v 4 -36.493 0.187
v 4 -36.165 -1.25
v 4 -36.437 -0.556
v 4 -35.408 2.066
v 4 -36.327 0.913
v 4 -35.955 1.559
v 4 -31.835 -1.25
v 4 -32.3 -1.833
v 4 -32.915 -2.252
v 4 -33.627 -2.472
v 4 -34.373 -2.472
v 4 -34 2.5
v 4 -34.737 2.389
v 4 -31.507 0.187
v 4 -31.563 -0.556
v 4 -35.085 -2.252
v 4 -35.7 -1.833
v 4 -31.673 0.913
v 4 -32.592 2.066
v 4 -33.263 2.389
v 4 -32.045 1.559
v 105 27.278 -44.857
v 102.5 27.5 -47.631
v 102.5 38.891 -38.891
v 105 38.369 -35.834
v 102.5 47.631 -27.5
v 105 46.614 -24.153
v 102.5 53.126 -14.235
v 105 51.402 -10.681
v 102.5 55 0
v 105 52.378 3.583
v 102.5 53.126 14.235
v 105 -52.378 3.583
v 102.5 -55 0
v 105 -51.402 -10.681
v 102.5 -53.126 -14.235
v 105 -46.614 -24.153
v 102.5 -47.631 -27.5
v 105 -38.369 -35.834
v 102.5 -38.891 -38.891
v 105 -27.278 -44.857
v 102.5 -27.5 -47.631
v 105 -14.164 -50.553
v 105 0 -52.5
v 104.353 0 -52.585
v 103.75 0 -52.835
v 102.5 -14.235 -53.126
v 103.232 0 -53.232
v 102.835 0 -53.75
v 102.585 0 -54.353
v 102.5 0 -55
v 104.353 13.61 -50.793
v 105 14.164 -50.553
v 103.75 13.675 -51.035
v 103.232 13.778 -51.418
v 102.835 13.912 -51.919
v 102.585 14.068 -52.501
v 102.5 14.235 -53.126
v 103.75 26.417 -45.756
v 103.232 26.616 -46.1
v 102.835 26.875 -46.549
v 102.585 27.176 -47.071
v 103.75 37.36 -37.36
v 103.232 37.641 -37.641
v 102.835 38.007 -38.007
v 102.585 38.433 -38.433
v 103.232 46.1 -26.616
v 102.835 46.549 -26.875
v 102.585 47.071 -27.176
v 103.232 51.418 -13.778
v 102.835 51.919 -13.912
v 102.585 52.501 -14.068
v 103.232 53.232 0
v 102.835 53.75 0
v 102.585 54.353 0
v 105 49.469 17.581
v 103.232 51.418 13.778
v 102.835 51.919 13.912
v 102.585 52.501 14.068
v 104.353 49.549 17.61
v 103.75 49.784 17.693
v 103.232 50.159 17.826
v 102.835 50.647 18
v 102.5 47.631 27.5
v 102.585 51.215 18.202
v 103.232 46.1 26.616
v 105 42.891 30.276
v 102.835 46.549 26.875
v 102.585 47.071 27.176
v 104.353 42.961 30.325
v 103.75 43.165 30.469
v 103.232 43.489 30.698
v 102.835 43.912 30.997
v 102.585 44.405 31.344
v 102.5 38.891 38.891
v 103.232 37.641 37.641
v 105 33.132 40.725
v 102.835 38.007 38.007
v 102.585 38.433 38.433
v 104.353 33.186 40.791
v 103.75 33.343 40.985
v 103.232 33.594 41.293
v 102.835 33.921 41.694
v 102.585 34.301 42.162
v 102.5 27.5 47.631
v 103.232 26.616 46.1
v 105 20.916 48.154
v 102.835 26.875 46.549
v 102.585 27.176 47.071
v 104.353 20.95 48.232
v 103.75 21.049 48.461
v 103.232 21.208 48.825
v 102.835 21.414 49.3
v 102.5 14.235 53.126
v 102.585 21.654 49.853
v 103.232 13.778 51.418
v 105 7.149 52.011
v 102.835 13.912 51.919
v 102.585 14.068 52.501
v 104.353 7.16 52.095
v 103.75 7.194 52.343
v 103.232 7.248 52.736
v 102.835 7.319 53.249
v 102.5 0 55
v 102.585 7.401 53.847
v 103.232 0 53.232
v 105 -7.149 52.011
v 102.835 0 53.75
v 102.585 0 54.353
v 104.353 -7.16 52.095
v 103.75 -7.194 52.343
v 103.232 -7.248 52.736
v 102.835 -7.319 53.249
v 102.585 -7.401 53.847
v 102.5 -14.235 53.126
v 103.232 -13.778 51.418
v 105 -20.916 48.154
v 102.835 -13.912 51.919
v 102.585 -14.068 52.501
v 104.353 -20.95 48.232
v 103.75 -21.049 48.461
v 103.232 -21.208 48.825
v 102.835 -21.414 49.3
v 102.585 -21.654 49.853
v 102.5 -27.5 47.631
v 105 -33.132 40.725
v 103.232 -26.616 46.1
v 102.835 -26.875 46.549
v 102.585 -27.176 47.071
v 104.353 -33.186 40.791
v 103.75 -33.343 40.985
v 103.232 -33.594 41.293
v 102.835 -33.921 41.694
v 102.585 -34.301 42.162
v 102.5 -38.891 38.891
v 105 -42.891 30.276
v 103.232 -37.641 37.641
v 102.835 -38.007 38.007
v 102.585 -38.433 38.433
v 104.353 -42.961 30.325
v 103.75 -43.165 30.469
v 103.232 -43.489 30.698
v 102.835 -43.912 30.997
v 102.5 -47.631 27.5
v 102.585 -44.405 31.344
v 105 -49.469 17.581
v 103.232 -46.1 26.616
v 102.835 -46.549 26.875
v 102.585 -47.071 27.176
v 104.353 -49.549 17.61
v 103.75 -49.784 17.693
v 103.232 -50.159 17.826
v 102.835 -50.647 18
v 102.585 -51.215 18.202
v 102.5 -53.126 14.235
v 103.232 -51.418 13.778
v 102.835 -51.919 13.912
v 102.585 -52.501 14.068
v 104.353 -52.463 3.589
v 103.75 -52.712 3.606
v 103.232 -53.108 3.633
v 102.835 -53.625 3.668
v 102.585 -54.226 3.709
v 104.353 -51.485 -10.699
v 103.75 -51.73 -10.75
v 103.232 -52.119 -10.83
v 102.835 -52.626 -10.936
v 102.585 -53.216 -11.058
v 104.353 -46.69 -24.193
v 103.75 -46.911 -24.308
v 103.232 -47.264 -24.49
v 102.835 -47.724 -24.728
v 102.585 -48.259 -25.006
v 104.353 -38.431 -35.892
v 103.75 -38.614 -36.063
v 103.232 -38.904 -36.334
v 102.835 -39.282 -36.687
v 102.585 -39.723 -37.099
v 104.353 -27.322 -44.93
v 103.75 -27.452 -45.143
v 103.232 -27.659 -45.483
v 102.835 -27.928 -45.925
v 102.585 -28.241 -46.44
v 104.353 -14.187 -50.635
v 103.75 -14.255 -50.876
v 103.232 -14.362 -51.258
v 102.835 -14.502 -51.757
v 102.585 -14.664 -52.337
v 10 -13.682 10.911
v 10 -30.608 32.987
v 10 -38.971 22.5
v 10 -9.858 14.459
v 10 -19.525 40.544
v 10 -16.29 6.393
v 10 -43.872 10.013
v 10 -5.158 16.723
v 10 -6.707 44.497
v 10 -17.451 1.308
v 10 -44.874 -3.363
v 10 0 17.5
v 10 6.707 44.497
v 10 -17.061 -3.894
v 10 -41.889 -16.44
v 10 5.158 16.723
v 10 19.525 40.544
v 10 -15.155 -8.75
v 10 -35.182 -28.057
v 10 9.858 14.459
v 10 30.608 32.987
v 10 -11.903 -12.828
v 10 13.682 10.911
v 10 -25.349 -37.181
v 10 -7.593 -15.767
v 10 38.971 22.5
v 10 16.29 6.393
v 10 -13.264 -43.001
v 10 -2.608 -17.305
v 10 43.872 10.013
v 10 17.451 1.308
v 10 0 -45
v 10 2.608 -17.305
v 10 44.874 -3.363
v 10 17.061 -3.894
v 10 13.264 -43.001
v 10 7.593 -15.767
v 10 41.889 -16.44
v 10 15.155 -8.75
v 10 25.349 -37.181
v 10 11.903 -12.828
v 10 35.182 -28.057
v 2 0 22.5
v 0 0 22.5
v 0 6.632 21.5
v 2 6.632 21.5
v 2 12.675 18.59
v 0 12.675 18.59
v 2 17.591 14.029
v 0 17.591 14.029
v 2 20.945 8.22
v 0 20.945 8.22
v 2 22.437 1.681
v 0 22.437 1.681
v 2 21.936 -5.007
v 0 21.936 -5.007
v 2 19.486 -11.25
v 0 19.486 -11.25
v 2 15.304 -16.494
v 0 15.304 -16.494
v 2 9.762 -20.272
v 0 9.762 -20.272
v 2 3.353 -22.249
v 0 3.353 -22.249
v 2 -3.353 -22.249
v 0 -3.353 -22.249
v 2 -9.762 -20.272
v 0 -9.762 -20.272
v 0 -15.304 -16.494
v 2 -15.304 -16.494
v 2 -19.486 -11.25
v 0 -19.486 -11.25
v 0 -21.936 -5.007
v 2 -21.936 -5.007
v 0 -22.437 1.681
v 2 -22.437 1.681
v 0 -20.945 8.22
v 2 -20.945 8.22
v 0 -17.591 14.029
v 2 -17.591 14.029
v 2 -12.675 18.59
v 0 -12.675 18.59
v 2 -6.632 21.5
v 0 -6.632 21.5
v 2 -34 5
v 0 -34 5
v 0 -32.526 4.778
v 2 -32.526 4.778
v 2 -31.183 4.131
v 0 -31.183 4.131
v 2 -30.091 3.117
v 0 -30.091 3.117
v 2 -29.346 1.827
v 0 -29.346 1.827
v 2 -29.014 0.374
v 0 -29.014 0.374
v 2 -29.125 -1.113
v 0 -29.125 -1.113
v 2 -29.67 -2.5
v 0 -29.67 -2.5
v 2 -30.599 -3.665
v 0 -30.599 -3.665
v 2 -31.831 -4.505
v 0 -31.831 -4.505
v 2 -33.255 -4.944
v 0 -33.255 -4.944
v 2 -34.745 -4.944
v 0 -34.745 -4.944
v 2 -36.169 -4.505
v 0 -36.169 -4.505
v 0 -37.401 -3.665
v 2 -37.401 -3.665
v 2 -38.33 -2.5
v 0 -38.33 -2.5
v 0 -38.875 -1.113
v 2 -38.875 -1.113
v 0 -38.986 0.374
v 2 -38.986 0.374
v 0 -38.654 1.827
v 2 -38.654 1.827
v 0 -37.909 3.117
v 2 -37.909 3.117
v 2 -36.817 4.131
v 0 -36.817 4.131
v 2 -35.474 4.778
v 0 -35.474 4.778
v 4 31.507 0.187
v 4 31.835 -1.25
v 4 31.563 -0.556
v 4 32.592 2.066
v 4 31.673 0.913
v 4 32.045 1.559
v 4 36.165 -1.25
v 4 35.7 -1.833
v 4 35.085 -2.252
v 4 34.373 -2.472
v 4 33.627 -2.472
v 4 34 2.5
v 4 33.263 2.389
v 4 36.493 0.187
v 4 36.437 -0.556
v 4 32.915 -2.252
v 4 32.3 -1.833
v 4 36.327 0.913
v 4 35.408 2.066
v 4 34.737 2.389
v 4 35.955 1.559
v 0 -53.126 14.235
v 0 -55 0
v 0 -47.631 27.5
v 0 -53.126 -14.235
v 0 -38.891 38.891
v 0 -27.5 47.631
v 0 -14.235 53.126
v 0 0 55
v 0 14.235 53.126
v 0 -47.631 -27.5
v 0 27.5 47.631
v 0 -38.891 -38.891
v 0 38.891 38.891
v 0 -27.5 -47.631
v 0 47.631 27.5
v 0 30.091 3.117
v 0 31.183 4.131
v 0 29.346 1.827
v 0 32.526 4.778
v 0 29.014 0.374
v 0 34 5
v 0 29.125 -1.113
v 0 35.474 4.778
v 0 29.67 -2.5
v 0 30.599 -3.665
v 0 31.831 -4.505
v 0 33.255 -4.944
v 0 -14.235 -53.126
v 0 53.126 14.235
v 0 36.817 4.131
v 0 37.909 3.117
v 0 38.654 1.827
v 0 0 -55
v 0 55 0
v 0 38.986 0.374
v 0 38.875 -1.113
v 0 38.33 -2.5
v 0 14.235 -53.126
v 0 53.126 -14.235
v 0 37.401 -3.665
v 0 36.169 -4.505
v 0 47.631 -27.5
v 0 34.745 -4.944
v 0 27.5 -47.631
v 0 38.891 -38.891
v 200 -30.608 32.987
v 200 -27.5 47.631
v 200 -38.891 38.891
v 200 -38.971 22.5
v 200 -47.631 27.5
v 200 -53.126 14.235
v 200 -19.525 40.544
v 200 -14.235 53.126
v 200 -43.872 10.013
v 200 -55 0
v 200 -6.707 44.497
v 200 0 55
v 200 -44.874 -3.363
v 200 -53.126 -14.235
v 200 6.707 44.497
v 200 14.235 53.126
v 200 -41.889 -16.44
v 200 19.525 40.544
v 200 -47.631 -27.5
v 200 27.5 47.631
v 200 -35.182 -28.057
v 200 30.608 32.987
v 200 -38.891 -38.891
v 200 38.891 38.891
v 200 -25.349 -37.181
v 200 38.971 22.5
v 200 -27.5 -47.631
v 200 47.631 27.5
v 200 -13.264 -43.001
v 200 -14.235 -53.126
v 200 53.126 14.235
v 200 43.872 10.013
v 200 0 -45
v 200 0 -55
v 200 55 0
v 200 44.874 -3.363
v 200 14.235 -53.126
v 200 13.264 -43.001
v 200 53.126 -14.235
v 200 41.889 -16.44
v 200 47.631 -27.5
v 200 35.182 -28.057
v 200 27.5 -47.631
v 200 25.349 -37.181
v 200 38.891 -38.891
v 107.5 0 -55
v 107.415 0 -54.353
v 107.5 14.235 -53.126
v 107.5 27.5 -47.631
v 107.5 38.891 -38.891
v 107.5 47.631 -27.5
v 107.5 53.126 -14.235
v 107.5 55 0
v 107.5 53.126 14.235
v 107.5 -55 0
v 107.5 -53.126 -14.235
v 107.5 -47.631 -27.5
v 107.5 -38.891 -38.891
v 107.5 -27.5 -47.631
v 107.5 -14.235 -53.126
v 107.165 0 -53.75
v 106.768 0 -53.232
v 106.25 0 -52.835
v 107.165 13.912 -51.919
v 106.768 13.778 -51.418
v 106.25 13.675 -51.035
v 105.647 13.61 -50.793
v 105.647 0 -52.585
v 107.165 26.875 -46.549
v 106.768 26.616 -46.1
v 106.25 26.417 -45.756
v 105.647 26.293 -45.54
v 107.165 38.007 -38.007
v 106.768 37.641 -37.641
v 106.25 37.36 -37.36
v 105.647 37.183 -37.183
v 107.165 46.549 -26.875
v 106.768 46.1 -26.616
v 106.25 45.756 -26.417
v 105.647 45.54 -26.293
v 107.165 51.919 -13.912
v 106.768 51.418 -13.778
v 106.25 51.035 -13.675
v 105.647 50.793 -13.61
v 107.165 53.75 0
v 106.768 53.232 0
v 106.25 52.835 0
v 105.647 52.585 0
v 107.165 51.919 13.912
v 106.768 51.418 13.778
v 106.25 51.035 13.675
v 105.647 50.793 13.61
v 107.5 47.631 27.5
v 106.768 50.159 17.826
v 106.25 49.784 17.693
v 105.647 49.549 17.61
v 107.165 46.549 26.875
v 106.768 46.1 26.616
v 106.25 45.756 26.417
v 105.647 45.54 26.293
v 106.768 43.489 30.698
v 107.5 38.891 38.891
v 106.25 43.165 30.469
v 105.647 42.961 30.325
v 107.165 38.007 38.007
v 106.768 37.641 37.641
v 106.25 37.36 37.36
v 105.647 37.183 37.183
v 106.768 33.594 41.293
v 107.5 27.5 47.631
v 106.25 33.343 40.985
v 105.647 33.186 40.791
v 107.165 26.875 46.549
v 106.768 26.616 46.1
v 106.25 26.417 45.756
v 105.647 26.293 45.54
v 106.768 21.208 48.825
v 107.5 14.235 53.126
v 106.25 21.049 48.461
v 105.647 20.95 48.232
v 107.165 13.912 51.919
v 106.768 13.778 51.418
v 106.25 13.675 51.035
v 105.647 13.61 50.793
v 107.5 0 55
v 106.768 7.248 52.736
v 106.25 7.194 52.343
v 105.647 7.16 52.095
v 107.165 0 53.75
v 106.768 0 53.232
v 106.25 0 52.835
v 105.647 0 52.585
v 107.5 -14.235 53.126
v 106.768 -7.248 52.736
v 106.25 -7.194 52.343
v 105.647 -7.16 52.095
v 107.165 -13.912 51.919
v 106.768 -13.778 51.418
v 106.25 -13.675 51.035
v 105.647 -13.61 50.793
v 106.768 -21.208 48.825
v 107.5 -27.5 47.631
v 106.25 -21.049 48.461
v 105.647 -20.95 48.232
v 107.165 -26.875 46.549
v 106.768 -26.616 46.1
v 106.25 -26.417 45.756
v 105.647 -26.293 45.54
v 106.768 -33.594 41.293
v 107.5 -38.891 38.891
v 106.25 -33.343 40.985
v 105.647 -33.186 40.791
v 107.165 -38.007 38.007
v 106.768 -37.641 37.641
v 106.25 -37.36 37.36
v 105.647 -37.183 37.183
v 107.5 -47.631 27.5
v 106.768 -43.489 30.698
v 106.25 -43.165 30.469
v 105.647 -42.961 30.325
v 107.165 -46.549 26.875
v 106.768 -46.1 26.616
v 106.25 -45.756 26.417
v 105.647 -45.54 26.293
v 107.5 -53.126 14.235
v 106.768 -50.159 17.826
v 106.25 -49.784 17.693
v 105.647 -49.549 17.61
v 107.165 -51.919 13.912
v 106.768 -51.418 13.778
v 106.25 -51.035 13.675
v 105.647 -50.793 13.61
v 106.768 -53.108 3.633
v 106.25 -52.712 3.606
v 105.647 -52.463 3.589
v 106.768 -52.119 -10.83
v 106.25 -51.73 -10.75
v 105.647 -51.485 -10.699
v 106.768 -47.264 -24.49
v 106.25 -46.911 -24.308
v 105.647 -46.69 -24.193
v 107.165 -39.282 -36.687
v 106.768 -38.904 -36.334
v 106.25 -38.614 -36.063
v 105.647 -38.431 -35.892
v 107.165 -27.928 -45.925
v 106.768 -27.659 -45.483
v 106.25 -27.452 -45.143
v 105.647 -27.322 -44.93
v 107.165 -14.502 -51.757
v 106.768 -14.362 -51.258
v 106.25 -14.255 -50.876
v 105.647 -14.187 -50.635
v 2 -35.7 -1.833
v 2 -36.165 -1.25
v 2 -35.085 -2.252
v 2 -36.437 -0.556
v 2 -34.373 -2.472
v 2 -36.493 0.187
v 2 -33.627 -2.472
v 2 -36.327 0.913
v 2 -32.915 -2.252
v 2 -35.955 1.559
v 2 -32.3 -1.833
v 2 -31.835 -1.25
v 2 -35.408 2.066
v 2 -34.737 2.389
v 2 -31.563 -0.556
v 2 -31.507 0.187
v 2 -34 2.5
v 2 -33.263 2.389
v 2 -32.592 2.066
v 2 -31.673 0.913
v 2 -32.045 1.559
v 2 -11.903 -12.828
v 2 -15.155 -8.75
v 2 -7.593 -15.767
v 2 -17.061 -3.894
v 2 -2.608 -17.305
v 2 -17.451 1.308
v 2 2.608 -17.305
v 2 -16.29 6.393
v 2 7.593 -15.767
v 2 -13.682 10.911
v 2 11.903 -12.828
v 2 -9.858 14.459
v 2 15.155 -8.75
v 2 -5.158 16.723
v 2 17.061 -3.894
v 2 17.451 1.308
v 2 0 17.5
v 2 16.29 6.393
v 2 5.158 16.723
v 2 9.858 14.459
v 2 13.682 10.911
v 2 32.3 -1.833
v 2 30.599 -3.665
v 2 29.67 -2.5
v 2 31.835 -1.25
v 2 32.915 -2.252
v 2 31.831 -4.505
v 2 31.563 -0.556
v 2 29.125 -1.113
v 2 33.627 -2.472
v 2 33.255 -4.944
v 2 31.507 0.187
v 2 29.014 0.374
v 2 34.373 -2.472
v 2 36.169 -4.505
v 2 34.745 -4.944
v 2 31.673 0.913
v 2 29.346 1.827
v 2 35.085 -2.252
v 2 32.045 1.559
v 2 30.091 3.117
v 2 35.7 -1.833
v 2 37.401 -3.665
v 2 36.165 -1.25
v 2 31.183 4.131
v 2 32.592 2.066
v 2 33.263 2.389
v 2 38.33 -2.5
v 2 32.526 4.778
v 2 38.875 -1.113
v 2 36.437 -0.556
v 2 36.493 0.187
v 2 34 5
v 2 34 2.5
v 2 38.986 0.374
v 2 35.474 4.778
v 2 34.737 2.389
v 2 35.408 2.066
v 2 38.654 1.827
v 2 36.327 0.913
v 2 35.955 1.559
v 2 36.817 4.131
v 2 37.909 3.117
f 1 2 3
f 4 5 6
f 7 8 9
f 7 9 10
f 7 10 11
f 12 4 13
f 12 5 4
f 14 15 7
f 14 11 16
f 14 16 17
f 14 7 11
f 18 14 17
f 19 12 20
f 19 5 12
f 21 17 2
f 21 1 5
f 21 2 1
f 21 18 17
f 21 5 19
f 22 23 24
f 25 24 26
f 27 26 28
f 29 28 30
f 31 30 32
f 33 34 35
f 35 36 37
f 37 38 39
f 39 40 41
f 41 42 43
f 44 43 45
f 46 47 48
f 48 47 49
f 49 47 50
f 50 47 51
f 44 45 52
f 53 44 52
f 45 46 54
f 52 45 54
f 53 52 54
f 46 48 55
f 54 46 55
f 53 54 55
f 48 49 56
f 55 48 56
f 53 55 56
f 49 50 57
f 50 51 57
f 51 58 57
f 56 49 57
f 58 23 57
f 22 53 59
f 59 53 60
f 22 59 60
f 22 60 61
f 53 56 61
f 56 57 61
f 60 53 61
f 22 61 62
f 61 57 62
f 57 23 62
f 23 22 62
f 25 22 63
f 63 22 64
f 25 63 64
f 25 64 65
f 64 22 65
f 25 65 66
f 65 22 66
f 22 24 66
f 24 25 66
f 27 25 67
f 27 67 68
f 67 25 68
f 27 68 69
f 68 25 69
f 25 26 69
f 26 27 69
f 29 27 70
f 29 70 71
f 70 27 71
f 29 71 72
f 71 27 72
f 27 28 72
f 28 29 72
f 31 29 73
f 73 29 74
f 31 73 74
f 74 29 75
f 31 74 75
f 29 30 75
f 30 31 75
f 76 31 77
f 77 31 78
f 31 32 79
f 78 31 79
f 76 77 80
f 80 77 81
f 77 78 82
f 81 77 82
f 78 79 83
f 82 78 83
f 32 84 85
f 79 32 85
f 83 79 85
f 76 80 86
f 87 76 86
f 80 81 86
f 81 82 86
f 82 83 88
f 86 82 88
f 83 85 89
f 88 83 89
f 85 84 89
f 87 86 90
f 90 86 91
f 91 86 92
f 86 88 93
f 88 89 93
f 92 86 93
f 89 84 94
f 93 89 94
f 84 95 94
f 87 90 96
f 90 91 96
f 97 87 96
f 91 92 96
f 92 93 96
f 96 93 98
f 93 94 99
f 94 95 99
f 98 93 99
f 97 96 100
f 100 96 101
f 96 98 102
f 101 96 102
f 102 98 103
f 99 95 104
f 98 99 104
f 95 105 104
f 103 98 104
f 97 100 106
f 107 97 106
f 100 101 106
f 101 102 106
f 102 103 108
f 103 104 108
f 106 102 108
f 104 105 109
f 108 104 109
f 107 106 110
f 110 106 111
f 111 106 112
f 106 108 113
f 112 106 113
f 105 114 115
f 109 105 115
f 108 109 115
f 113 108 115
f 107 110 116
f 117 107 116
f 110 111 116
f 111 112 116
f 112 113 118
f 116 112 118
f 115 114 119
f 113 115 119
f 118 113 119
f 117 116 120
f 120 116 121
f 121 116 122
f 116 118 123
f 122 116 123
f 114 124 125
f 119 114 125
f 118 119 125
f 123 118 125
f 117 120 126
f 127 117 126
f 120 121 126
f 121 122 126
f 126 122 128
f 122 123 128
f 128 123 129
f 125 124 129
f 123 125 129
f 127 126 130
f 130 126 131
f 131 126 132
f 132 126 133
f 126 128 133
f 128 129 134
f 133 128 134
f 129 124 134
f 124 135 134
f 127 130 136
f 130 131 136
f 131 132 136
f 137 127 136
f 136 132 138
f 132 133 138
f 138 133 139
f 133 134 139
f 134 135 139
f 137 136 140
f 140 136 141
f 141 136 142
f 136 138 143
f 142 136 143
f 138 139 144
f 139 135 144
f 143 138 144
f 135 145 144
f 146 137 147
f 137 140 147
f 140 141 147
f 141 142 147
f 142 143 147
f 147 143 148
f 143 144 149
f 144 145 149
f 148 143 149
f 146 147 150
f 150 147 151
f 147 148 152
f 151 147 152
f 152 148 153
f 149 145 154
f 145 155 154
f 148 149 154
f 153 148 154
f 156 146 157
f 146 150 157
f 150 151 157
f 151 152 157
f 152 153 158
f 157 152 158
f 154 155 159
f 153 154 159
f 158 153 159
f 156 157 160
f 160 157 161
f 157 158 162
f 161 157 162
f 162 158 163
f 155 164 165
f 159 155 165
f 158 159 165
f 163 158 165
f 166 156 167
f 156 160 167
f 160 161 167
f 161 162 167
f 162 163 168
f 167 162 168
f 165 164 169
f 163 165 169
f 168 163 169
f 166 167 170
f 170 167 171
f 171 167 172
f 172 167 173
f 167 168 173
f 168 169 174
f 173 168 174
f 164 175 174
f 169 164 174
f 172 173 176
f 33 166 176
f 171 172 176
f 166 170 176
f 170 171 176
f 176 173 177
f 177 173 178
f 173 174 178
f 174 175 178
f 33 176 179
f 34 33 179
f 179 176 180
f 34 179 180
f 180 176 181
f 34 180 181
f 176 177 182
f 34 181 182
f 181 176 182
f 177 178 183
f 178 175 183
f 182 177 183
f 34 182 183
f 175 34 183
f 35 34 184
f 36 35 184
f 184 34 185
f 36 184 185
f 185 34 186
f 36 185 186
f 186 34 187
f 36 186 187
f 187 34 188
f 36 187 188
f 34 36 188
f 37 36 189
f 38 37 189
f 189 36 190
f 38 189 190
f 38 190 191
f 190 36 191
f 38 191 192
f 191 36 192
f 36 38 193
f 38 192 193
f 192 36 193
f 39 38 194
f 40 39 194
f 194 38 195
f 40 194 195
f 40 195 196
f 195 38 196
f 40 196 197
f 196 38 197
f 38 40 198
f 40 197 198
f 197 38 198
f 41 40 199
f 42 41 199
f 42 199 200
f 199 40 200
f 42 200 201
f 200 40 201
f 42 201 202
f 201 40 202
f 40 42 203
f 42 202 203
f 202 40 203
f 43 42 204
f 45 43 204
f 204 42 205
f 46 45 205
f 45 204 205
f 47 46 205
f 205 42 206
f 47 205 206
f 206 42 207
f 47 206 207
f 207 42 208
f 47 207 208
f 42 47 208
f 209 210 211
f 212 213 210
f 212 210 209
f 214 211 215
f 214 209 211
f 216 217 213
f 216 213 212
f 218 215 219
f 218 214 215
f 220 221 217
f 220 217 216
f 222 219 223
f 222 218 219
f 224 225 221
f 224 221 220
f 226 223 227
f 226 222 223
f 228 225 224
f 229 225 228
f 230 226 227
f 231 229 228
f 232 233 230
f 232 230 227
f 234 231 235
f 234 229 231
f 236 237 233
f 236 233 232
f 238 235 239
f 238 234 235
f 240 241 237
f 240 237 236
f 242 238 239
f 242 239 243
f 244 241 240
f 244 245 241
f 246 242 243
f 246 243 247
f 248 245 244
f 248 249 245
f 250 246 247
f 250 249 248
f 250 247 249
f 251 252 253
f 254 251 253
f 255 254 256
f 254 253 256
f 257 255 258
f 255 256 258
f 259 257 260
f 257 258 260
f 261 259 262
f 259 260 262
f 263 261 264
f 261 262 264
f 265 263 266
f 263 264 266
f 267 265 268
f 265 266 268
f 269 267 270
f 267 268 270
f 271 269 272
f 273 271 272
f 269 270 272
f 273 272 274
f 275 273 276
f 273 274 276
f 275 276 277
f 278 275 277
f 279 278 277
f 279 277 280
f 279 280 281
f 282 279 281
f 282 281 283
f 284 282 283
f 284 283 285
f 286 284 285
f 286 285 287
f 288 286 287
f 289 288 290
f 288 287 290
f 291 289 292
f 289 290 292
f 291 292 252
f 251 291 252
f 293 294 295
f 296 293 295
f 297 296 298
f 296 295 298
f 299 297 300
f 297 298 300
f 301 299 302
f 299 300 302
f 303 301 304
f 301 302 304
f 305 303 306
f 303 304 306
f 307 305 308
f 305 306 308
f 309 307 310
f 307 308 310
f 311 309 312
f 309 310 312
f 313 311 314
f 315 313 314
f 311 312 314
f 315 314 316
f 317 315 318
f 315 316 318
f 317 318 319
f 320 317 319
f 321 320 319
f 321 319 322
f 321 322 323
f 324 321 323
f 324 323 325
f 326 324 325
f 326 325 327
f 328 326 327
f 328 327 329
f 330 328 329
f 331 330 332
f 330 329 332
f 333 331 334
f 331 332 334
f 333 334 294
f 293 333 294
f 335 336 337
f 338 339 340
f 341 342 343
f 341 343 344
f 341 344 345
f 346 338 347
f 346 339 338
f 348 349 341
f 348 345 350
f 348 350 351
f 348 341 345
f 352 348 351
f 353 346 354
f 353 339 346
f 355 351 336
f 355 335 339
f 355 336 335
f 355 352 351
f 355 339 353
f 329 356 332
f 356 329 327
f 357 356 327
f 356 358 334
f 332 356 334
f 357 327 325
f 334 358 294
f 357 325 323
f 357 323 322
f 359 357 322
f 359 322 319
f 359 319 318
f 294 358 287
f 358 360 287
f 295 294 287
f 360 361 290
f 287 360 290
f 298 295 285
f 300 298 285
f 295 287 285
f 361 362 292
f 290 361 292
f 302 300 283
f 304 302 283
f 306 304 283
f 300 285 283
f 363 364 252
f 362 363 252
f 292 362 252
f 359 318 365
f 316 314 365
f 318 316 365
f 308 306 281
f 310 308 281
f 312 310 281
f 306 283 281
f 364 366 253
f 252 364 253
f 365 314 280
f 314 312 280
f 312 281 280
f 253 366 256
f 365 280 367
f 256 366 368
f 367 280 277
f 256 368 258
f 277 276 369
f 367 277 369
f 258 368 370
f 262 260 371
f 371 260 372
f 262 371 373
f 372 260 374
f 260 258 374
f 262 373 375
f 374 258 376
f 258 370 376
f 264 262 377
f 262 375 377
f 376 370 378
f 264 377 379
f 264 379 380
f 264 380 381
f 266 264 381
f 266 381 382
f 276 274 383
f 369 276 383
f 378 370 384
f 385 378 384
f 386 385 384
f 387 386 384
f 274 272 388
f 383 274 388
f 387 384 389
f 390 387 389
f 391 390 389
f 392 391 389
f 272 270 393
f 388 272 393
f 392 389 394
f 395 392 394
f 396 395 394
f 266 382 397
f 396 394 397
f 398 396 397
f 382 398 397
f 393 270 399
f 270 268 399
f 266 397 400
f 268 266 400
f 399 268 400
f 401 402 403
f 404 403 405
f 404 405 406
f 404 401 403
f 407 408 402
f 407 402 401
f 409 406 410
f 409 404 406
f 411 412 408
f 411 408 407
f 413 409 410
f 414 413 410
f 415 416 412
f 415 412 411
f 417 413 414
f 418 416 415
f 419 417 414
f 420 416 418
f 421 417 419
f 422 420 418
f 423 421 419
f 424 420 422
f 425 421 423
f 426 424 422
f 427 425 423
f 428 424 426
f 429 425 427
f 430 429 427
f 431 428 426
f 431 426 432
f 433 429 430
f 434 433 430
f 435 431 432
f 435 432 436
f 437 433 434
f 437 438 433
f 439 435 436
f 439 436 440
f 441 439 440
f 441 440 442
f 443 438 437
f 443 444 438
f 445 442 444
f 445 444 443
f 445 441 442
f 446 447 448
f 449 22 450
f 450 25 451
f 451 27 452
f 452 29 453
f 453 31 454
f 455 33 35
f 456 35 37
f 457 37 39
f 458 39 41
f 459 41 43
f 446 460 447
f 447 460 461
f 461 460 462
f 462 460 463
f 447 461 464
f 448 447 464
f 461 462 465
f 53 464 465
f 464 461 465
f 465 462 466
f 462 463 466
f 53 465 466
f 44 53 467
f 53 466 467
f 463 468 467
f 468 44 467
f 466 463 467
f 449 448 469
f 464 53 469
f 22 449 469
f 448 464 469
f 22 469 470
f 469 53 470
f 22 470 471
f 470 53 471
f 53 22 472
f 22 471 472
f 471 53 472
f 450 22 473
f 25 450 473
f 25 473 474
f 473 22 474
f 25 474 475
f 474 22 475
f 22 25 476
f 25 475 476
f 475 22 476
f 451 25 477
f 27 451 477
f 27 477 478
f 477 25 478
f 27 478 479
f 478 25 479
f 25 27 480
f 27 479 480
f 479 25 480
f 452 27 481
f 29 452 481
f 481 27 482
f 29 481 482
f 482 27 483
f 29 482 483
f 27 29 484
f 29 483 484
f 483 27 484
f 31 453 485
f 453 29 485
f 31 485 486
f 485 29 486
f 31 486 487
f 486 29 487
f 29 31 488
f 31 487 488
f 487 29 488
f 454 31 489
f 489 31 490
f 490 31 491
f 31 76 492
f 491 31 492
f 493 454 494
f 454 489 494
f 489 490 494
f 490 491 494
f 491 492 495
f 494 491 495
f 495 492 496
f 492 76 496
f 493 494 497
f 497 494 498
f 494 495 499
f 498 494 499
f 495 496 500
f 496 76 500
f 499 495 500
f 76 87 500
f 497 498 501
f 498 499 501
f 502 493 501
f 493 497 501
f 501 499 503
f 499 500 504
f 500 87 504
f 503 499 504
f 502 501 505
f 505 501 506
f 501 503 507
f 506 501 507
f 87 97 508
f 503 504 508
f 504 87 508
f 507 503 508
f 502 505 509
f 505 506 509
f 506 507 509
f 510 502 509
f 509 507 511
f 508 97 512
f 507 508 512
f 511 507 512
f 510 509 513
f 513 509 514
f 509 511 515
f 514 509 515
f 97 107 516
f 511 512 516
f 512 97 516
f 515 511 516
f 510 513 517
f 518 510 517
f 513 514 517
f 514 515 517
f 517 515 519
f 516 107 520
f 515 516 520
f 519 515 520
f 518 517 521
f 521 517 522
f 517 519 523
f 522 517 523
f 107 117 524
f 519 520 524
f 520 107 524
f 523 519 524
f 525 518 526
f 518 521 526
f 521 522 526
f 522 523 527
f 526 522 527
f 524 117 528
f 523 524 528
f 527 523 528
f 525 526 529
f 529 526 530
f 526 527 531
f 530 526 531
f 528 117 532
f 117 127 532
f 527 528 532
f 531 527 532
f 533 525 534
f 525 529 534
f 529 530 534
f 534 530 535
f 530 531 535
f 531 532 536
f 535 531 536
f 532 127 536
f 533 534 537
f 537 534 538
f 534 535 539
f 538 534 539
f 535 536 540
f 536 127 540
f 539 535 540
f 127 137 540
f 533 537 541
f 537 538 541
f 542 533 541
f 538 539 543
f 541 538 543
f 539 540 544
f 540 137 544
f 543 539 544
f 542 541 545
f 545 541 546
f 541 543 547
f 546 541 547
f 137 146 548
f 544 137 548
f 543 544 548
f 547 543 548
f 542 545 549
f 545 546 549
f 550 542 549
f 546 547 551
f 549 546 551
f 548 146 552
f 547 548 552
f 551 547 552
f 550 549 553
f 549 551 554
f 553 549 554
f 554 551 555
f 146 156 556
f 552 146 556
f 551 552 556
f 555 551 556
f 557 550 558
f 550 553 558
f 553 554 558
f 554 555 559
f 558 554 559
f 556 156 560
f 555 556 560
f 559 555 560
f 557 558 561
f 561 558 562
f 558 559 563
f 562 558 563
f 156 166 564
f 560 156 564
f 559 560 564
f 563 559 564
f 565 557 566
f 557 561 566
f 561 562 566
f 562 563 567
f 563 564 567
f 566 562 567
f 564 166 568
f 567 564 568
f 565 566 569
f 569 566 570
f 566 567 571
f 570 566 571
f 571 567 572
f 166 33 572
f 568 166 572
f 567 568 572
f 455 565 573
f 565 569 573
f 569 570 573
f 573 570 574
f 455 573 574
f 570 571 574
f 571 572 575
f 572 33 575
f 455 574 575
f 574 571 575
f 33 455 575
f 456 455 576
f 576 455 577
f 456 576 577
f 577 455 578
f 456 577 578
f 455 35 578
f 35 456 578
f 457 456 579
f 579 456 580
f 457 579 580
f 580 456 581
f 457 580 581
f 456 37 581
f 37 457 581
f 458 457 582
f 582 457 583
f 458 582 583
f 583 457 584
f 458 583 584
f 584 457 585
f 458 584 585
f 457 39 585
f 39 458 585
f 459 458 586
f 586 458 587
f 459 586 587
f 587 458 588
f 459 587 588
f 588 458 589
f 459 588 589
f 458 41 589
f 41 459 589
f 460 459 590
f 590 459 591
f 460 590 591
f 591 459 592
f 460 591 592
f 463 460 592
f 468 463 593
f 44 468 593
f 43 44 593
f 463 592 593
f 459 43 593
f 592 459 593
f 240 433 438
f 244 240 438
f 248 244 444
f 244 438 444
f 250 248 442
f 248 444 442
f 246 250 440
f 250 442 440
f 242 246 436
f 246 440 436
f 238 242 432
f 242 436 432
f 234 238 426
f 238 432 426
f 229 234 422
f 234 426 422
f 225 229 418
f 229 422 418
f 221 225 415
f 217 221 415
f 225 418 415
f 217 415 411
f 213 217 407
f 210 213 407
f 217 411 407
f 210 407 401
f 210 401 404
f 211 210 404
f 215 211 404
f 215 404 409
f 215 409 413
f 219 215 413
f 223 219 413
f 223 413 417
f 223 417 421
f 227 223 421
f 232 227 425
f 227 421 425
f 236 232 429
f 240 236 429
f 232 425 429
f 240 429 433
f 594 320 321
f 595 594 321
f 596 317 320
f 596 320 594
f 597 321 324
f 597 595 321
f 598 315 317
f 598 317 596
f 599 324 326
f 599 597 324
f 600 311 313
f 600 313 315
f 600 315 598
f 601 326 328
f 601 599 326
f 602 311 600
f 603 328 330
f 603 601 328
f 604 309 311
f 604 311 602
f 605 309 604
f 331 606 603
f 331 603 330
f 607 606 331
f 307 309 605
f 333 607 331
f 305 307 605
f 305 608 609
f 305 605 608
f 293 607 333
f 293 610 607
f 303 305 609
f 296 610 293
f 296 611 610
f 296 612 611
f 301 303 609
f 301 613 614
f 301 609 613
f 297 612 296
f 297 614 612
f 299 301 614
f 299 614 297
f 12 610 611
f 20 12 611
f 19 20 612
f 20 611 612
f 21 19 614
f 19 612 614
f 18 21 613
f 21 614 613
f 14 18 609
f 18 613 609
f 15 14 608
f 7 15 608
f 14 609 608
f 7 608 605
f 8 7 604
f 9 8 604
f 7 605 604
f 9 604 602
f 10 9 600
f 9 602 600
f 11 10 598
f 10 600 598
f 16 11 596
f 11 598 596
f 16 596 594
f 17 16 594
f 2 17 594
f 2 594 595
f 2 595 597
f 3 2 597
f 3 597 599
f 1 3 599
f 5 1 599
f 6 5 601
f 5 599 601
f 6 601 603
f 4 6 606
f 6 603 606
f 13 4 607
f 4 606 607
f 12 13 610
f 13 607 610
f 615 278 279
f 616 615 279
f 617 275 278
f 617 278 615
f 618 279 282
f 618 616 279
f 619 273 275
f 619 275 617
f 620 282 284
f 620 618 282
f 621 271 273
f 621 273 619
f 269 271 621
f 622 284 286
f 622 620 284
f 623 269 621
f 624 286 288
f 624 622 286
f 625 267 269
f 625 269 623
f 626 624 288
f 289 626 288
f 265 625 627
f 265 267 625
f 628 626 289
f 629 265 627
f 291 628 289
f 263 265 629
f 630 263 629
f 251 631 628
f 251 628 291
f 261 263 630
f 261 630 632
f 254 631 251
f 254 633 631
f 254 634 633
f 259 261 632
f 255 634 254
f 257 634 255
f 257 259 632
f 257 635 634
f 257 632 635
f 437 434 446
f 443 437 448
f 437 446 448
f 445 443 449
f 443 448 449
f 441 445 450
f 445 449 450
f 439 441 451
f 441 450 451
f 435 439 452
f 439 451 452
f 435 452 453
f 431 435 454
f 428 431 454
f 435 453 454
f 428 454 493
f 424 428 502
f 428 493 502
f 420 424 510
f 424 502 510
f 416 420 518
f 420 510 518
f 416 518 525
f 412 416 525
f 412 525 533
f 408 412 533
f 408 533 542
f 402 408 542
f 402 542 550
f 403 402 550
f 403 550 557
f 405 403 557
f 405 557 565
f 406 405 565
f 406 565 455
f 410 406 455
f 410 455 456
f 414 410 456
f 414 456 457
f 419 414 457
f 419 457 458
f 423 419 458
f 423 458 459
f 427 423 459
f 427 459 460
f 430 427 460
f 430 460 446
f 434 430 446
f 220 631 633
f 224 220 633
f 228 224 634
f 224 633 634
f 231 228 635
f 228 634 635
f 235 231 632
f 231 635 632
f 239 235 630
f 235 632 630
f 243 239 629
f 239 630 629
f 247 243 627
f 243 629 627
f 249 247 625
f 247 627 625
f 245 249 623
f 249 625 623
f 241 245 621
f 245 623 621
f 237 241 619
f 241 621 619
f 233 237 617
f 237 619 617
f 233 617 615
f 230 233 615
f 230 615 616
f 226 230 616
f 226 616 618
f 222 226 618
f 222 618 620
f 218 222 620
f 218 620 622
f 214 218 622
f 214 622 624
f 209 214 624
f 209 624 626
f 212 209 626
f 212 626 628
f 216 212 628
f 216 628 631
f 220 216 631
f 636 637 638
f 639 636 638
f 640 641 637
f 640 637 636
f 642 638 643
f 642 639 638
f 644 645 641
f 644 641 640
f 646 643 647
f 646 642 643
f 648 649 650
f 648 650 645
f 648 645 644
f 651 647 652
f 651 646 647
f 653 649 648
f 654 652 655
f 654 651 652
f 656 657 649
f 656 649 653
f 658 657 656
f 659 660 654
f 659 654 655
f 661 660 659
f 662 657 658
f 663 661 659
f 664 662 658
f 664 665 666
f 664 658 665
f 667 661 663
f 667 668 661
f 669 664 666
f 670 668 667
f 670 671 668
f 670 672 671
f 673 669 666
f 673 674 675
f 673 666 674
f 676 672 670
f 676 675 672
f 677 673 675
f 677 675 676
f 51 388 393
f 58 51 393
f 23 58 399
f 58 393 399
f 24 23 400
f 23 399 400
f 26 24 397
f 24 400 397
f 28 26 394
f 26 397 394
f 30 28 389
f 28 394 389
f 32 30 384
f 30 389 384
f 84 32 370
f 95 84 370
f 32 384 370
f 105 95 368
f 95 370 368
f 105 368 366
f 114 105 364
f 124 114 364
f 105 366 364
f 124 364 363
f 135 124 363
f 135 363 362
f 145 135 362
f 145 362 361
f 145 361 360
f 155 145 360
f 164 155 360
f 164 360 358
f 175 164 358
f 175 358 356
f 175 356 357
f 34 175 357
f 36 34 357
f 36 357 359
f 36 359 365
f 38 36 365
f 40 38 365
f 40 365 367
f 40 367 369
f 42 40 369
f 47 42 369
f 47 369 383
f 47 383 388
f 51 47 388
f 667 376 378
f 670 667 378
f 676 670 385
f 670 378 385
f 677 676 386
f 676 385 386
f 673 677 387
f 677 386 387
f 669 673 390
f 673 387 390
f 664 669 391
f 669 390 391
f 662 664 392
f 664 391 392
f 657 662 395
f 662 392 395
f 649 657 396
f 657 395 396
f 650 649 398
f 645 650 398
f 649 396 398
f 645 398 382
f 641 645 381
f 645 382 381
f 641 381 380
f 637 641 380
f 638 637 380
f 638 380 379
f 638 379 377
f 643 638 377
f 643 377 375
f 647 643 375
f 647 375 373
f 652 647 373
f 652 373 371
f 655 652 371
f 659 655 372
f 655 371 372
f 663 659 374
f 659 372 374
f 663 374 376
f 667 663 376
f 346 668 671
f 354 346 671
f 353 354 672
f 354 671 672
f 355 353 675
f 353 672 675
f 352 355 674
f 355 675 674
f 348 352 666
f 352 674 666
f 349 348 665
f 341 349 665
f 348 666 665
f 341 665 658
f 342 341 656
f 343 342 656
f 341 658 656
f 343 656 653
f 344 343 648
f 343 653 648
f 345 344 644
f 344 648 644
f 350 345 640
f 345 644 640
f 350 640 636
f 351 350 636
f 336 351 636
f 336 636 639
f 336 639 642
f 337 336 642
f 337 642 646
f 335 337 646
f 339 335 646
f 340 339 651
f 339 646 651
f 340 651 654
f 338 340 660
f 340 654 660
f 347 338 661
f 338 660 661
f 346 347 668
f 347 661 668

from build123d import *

# Parameters (mm, degrees)
SKETCH1_R               = 55
BOSS_EXTRUDE1_DEPTH     = 200
SKETCH2_R               = 45
CUT_EXTRUDE1_DEPTH      = 190
SKETCH3_R               = 17.5
CUT_EXTRUDE2_DEPTH      = 1
CUT_EXTRUDE2_DEPTH_BACK = 201
SKETCH4_R               = 5
CUT_EXTRUDE3_DEPTH      = 2
SKETCH5_R               = 22.5
CUT_EXTRUDE4_DEPTH      = 2
CUT_SWEEP1_PROFILE_R    = 2.5
SKETCH58_R              = 2.5
CUT_EXTRUDE5_DEPTH      = 2


with BuildPart() as part:
    # Sketch1 → Boss-Extrude1 (new body)
    with BuildSketch(Plane(origin=(0, 0, 0), x_dir=(0, 0, -1), z_dir=(1, 0, 0))):
        Circle(SKETCH1_R)
    extrude(amount=BOSS_EXTRUDE1_DEPTH)

    # Sketch2 → Cut-Extrude1 (cut)
    with BuildSketch(Plane(origin=(200, 0, 0), x_dir=(0, 0, -1), z_dir=(1, 0, 0))):
        Circle(SKETCH2_R)
    extrude(amount=-CUT_EXTRUDE1_DEPTH, mode=Mode.SUBTRACT)

    # Sketch3 → Cut-Extrude2 (cut, two sides)
    with BuildSketch(Plane.ZY) as cut_extrude2_sk:
        Circle(SKETCH3_R)
    extrude(amount=CUT_EXTRUDE2_DEPTH, mode=Mode.SUBTRACT)
    extrude(cut_extrude2_sk.sketch, amount=-CUT_EXTRUDE2_DEPTH_BACK, mode=Mode.SUBTRACT)

    # Sketch4 → Cut-Extrude3 (cut)
    with BuildSketch(Plane.ZY):
        with Locations((0, 34)):
            Circle(SKETCH4_R)
        with Locations((0, -34)):
            Circle(SKETCH4_R)
    extrude(amount=-CUT_EXTRUDE3_DEPTH, mode=Mode.SUBTRACT)

    # Sketch5 → Cut-Extrude4 (cut)
    with BuildSketch(Plane.ZY):
        Circle(SKETCH5_R)
    extrude(amount=-CUT_EXTRUDE4_DEPTH, mode=Mode.SUBTRACT)

    # Cut-Sweep1: sweep along a path in Sketch57
    with BuildLine(Plane(origin=(105, 0, 0), x_dir=(0, 0, -1), z_dir=(1, 0, 0))) as cut_sweep1_path:
        CenterArc((0, 0), 55, 0, 360)
    # Cut-Sweep1 profile (on start of the path) → Cut-Sweep1 (sweep, cut)
    with BuildSketch(Plane(origin=(105, 0, -55), x_dir=(0, 0, 1), z_dir=(0, 1, 0))):
        Circle(CUT_SWEEP1_PROFILE_R)
    sweep(path=cut_sweep1_path.line, mode=Mode.SUBTRACT)

    # Sketch58 → Cut-Extrude5 (cut)
    with BuildSketch(Plane.ZY.offset(-2)):
        with Locations((0, 34)):
            Circle(SKETCH58_R)
        with Locations((0, -34)):
            Circle(SKETCH58_R)
    extrude(amount=-CUT_EXTRUDE5_DEPTH, mode=Mode.SUBTRACT)


solid = part.part
